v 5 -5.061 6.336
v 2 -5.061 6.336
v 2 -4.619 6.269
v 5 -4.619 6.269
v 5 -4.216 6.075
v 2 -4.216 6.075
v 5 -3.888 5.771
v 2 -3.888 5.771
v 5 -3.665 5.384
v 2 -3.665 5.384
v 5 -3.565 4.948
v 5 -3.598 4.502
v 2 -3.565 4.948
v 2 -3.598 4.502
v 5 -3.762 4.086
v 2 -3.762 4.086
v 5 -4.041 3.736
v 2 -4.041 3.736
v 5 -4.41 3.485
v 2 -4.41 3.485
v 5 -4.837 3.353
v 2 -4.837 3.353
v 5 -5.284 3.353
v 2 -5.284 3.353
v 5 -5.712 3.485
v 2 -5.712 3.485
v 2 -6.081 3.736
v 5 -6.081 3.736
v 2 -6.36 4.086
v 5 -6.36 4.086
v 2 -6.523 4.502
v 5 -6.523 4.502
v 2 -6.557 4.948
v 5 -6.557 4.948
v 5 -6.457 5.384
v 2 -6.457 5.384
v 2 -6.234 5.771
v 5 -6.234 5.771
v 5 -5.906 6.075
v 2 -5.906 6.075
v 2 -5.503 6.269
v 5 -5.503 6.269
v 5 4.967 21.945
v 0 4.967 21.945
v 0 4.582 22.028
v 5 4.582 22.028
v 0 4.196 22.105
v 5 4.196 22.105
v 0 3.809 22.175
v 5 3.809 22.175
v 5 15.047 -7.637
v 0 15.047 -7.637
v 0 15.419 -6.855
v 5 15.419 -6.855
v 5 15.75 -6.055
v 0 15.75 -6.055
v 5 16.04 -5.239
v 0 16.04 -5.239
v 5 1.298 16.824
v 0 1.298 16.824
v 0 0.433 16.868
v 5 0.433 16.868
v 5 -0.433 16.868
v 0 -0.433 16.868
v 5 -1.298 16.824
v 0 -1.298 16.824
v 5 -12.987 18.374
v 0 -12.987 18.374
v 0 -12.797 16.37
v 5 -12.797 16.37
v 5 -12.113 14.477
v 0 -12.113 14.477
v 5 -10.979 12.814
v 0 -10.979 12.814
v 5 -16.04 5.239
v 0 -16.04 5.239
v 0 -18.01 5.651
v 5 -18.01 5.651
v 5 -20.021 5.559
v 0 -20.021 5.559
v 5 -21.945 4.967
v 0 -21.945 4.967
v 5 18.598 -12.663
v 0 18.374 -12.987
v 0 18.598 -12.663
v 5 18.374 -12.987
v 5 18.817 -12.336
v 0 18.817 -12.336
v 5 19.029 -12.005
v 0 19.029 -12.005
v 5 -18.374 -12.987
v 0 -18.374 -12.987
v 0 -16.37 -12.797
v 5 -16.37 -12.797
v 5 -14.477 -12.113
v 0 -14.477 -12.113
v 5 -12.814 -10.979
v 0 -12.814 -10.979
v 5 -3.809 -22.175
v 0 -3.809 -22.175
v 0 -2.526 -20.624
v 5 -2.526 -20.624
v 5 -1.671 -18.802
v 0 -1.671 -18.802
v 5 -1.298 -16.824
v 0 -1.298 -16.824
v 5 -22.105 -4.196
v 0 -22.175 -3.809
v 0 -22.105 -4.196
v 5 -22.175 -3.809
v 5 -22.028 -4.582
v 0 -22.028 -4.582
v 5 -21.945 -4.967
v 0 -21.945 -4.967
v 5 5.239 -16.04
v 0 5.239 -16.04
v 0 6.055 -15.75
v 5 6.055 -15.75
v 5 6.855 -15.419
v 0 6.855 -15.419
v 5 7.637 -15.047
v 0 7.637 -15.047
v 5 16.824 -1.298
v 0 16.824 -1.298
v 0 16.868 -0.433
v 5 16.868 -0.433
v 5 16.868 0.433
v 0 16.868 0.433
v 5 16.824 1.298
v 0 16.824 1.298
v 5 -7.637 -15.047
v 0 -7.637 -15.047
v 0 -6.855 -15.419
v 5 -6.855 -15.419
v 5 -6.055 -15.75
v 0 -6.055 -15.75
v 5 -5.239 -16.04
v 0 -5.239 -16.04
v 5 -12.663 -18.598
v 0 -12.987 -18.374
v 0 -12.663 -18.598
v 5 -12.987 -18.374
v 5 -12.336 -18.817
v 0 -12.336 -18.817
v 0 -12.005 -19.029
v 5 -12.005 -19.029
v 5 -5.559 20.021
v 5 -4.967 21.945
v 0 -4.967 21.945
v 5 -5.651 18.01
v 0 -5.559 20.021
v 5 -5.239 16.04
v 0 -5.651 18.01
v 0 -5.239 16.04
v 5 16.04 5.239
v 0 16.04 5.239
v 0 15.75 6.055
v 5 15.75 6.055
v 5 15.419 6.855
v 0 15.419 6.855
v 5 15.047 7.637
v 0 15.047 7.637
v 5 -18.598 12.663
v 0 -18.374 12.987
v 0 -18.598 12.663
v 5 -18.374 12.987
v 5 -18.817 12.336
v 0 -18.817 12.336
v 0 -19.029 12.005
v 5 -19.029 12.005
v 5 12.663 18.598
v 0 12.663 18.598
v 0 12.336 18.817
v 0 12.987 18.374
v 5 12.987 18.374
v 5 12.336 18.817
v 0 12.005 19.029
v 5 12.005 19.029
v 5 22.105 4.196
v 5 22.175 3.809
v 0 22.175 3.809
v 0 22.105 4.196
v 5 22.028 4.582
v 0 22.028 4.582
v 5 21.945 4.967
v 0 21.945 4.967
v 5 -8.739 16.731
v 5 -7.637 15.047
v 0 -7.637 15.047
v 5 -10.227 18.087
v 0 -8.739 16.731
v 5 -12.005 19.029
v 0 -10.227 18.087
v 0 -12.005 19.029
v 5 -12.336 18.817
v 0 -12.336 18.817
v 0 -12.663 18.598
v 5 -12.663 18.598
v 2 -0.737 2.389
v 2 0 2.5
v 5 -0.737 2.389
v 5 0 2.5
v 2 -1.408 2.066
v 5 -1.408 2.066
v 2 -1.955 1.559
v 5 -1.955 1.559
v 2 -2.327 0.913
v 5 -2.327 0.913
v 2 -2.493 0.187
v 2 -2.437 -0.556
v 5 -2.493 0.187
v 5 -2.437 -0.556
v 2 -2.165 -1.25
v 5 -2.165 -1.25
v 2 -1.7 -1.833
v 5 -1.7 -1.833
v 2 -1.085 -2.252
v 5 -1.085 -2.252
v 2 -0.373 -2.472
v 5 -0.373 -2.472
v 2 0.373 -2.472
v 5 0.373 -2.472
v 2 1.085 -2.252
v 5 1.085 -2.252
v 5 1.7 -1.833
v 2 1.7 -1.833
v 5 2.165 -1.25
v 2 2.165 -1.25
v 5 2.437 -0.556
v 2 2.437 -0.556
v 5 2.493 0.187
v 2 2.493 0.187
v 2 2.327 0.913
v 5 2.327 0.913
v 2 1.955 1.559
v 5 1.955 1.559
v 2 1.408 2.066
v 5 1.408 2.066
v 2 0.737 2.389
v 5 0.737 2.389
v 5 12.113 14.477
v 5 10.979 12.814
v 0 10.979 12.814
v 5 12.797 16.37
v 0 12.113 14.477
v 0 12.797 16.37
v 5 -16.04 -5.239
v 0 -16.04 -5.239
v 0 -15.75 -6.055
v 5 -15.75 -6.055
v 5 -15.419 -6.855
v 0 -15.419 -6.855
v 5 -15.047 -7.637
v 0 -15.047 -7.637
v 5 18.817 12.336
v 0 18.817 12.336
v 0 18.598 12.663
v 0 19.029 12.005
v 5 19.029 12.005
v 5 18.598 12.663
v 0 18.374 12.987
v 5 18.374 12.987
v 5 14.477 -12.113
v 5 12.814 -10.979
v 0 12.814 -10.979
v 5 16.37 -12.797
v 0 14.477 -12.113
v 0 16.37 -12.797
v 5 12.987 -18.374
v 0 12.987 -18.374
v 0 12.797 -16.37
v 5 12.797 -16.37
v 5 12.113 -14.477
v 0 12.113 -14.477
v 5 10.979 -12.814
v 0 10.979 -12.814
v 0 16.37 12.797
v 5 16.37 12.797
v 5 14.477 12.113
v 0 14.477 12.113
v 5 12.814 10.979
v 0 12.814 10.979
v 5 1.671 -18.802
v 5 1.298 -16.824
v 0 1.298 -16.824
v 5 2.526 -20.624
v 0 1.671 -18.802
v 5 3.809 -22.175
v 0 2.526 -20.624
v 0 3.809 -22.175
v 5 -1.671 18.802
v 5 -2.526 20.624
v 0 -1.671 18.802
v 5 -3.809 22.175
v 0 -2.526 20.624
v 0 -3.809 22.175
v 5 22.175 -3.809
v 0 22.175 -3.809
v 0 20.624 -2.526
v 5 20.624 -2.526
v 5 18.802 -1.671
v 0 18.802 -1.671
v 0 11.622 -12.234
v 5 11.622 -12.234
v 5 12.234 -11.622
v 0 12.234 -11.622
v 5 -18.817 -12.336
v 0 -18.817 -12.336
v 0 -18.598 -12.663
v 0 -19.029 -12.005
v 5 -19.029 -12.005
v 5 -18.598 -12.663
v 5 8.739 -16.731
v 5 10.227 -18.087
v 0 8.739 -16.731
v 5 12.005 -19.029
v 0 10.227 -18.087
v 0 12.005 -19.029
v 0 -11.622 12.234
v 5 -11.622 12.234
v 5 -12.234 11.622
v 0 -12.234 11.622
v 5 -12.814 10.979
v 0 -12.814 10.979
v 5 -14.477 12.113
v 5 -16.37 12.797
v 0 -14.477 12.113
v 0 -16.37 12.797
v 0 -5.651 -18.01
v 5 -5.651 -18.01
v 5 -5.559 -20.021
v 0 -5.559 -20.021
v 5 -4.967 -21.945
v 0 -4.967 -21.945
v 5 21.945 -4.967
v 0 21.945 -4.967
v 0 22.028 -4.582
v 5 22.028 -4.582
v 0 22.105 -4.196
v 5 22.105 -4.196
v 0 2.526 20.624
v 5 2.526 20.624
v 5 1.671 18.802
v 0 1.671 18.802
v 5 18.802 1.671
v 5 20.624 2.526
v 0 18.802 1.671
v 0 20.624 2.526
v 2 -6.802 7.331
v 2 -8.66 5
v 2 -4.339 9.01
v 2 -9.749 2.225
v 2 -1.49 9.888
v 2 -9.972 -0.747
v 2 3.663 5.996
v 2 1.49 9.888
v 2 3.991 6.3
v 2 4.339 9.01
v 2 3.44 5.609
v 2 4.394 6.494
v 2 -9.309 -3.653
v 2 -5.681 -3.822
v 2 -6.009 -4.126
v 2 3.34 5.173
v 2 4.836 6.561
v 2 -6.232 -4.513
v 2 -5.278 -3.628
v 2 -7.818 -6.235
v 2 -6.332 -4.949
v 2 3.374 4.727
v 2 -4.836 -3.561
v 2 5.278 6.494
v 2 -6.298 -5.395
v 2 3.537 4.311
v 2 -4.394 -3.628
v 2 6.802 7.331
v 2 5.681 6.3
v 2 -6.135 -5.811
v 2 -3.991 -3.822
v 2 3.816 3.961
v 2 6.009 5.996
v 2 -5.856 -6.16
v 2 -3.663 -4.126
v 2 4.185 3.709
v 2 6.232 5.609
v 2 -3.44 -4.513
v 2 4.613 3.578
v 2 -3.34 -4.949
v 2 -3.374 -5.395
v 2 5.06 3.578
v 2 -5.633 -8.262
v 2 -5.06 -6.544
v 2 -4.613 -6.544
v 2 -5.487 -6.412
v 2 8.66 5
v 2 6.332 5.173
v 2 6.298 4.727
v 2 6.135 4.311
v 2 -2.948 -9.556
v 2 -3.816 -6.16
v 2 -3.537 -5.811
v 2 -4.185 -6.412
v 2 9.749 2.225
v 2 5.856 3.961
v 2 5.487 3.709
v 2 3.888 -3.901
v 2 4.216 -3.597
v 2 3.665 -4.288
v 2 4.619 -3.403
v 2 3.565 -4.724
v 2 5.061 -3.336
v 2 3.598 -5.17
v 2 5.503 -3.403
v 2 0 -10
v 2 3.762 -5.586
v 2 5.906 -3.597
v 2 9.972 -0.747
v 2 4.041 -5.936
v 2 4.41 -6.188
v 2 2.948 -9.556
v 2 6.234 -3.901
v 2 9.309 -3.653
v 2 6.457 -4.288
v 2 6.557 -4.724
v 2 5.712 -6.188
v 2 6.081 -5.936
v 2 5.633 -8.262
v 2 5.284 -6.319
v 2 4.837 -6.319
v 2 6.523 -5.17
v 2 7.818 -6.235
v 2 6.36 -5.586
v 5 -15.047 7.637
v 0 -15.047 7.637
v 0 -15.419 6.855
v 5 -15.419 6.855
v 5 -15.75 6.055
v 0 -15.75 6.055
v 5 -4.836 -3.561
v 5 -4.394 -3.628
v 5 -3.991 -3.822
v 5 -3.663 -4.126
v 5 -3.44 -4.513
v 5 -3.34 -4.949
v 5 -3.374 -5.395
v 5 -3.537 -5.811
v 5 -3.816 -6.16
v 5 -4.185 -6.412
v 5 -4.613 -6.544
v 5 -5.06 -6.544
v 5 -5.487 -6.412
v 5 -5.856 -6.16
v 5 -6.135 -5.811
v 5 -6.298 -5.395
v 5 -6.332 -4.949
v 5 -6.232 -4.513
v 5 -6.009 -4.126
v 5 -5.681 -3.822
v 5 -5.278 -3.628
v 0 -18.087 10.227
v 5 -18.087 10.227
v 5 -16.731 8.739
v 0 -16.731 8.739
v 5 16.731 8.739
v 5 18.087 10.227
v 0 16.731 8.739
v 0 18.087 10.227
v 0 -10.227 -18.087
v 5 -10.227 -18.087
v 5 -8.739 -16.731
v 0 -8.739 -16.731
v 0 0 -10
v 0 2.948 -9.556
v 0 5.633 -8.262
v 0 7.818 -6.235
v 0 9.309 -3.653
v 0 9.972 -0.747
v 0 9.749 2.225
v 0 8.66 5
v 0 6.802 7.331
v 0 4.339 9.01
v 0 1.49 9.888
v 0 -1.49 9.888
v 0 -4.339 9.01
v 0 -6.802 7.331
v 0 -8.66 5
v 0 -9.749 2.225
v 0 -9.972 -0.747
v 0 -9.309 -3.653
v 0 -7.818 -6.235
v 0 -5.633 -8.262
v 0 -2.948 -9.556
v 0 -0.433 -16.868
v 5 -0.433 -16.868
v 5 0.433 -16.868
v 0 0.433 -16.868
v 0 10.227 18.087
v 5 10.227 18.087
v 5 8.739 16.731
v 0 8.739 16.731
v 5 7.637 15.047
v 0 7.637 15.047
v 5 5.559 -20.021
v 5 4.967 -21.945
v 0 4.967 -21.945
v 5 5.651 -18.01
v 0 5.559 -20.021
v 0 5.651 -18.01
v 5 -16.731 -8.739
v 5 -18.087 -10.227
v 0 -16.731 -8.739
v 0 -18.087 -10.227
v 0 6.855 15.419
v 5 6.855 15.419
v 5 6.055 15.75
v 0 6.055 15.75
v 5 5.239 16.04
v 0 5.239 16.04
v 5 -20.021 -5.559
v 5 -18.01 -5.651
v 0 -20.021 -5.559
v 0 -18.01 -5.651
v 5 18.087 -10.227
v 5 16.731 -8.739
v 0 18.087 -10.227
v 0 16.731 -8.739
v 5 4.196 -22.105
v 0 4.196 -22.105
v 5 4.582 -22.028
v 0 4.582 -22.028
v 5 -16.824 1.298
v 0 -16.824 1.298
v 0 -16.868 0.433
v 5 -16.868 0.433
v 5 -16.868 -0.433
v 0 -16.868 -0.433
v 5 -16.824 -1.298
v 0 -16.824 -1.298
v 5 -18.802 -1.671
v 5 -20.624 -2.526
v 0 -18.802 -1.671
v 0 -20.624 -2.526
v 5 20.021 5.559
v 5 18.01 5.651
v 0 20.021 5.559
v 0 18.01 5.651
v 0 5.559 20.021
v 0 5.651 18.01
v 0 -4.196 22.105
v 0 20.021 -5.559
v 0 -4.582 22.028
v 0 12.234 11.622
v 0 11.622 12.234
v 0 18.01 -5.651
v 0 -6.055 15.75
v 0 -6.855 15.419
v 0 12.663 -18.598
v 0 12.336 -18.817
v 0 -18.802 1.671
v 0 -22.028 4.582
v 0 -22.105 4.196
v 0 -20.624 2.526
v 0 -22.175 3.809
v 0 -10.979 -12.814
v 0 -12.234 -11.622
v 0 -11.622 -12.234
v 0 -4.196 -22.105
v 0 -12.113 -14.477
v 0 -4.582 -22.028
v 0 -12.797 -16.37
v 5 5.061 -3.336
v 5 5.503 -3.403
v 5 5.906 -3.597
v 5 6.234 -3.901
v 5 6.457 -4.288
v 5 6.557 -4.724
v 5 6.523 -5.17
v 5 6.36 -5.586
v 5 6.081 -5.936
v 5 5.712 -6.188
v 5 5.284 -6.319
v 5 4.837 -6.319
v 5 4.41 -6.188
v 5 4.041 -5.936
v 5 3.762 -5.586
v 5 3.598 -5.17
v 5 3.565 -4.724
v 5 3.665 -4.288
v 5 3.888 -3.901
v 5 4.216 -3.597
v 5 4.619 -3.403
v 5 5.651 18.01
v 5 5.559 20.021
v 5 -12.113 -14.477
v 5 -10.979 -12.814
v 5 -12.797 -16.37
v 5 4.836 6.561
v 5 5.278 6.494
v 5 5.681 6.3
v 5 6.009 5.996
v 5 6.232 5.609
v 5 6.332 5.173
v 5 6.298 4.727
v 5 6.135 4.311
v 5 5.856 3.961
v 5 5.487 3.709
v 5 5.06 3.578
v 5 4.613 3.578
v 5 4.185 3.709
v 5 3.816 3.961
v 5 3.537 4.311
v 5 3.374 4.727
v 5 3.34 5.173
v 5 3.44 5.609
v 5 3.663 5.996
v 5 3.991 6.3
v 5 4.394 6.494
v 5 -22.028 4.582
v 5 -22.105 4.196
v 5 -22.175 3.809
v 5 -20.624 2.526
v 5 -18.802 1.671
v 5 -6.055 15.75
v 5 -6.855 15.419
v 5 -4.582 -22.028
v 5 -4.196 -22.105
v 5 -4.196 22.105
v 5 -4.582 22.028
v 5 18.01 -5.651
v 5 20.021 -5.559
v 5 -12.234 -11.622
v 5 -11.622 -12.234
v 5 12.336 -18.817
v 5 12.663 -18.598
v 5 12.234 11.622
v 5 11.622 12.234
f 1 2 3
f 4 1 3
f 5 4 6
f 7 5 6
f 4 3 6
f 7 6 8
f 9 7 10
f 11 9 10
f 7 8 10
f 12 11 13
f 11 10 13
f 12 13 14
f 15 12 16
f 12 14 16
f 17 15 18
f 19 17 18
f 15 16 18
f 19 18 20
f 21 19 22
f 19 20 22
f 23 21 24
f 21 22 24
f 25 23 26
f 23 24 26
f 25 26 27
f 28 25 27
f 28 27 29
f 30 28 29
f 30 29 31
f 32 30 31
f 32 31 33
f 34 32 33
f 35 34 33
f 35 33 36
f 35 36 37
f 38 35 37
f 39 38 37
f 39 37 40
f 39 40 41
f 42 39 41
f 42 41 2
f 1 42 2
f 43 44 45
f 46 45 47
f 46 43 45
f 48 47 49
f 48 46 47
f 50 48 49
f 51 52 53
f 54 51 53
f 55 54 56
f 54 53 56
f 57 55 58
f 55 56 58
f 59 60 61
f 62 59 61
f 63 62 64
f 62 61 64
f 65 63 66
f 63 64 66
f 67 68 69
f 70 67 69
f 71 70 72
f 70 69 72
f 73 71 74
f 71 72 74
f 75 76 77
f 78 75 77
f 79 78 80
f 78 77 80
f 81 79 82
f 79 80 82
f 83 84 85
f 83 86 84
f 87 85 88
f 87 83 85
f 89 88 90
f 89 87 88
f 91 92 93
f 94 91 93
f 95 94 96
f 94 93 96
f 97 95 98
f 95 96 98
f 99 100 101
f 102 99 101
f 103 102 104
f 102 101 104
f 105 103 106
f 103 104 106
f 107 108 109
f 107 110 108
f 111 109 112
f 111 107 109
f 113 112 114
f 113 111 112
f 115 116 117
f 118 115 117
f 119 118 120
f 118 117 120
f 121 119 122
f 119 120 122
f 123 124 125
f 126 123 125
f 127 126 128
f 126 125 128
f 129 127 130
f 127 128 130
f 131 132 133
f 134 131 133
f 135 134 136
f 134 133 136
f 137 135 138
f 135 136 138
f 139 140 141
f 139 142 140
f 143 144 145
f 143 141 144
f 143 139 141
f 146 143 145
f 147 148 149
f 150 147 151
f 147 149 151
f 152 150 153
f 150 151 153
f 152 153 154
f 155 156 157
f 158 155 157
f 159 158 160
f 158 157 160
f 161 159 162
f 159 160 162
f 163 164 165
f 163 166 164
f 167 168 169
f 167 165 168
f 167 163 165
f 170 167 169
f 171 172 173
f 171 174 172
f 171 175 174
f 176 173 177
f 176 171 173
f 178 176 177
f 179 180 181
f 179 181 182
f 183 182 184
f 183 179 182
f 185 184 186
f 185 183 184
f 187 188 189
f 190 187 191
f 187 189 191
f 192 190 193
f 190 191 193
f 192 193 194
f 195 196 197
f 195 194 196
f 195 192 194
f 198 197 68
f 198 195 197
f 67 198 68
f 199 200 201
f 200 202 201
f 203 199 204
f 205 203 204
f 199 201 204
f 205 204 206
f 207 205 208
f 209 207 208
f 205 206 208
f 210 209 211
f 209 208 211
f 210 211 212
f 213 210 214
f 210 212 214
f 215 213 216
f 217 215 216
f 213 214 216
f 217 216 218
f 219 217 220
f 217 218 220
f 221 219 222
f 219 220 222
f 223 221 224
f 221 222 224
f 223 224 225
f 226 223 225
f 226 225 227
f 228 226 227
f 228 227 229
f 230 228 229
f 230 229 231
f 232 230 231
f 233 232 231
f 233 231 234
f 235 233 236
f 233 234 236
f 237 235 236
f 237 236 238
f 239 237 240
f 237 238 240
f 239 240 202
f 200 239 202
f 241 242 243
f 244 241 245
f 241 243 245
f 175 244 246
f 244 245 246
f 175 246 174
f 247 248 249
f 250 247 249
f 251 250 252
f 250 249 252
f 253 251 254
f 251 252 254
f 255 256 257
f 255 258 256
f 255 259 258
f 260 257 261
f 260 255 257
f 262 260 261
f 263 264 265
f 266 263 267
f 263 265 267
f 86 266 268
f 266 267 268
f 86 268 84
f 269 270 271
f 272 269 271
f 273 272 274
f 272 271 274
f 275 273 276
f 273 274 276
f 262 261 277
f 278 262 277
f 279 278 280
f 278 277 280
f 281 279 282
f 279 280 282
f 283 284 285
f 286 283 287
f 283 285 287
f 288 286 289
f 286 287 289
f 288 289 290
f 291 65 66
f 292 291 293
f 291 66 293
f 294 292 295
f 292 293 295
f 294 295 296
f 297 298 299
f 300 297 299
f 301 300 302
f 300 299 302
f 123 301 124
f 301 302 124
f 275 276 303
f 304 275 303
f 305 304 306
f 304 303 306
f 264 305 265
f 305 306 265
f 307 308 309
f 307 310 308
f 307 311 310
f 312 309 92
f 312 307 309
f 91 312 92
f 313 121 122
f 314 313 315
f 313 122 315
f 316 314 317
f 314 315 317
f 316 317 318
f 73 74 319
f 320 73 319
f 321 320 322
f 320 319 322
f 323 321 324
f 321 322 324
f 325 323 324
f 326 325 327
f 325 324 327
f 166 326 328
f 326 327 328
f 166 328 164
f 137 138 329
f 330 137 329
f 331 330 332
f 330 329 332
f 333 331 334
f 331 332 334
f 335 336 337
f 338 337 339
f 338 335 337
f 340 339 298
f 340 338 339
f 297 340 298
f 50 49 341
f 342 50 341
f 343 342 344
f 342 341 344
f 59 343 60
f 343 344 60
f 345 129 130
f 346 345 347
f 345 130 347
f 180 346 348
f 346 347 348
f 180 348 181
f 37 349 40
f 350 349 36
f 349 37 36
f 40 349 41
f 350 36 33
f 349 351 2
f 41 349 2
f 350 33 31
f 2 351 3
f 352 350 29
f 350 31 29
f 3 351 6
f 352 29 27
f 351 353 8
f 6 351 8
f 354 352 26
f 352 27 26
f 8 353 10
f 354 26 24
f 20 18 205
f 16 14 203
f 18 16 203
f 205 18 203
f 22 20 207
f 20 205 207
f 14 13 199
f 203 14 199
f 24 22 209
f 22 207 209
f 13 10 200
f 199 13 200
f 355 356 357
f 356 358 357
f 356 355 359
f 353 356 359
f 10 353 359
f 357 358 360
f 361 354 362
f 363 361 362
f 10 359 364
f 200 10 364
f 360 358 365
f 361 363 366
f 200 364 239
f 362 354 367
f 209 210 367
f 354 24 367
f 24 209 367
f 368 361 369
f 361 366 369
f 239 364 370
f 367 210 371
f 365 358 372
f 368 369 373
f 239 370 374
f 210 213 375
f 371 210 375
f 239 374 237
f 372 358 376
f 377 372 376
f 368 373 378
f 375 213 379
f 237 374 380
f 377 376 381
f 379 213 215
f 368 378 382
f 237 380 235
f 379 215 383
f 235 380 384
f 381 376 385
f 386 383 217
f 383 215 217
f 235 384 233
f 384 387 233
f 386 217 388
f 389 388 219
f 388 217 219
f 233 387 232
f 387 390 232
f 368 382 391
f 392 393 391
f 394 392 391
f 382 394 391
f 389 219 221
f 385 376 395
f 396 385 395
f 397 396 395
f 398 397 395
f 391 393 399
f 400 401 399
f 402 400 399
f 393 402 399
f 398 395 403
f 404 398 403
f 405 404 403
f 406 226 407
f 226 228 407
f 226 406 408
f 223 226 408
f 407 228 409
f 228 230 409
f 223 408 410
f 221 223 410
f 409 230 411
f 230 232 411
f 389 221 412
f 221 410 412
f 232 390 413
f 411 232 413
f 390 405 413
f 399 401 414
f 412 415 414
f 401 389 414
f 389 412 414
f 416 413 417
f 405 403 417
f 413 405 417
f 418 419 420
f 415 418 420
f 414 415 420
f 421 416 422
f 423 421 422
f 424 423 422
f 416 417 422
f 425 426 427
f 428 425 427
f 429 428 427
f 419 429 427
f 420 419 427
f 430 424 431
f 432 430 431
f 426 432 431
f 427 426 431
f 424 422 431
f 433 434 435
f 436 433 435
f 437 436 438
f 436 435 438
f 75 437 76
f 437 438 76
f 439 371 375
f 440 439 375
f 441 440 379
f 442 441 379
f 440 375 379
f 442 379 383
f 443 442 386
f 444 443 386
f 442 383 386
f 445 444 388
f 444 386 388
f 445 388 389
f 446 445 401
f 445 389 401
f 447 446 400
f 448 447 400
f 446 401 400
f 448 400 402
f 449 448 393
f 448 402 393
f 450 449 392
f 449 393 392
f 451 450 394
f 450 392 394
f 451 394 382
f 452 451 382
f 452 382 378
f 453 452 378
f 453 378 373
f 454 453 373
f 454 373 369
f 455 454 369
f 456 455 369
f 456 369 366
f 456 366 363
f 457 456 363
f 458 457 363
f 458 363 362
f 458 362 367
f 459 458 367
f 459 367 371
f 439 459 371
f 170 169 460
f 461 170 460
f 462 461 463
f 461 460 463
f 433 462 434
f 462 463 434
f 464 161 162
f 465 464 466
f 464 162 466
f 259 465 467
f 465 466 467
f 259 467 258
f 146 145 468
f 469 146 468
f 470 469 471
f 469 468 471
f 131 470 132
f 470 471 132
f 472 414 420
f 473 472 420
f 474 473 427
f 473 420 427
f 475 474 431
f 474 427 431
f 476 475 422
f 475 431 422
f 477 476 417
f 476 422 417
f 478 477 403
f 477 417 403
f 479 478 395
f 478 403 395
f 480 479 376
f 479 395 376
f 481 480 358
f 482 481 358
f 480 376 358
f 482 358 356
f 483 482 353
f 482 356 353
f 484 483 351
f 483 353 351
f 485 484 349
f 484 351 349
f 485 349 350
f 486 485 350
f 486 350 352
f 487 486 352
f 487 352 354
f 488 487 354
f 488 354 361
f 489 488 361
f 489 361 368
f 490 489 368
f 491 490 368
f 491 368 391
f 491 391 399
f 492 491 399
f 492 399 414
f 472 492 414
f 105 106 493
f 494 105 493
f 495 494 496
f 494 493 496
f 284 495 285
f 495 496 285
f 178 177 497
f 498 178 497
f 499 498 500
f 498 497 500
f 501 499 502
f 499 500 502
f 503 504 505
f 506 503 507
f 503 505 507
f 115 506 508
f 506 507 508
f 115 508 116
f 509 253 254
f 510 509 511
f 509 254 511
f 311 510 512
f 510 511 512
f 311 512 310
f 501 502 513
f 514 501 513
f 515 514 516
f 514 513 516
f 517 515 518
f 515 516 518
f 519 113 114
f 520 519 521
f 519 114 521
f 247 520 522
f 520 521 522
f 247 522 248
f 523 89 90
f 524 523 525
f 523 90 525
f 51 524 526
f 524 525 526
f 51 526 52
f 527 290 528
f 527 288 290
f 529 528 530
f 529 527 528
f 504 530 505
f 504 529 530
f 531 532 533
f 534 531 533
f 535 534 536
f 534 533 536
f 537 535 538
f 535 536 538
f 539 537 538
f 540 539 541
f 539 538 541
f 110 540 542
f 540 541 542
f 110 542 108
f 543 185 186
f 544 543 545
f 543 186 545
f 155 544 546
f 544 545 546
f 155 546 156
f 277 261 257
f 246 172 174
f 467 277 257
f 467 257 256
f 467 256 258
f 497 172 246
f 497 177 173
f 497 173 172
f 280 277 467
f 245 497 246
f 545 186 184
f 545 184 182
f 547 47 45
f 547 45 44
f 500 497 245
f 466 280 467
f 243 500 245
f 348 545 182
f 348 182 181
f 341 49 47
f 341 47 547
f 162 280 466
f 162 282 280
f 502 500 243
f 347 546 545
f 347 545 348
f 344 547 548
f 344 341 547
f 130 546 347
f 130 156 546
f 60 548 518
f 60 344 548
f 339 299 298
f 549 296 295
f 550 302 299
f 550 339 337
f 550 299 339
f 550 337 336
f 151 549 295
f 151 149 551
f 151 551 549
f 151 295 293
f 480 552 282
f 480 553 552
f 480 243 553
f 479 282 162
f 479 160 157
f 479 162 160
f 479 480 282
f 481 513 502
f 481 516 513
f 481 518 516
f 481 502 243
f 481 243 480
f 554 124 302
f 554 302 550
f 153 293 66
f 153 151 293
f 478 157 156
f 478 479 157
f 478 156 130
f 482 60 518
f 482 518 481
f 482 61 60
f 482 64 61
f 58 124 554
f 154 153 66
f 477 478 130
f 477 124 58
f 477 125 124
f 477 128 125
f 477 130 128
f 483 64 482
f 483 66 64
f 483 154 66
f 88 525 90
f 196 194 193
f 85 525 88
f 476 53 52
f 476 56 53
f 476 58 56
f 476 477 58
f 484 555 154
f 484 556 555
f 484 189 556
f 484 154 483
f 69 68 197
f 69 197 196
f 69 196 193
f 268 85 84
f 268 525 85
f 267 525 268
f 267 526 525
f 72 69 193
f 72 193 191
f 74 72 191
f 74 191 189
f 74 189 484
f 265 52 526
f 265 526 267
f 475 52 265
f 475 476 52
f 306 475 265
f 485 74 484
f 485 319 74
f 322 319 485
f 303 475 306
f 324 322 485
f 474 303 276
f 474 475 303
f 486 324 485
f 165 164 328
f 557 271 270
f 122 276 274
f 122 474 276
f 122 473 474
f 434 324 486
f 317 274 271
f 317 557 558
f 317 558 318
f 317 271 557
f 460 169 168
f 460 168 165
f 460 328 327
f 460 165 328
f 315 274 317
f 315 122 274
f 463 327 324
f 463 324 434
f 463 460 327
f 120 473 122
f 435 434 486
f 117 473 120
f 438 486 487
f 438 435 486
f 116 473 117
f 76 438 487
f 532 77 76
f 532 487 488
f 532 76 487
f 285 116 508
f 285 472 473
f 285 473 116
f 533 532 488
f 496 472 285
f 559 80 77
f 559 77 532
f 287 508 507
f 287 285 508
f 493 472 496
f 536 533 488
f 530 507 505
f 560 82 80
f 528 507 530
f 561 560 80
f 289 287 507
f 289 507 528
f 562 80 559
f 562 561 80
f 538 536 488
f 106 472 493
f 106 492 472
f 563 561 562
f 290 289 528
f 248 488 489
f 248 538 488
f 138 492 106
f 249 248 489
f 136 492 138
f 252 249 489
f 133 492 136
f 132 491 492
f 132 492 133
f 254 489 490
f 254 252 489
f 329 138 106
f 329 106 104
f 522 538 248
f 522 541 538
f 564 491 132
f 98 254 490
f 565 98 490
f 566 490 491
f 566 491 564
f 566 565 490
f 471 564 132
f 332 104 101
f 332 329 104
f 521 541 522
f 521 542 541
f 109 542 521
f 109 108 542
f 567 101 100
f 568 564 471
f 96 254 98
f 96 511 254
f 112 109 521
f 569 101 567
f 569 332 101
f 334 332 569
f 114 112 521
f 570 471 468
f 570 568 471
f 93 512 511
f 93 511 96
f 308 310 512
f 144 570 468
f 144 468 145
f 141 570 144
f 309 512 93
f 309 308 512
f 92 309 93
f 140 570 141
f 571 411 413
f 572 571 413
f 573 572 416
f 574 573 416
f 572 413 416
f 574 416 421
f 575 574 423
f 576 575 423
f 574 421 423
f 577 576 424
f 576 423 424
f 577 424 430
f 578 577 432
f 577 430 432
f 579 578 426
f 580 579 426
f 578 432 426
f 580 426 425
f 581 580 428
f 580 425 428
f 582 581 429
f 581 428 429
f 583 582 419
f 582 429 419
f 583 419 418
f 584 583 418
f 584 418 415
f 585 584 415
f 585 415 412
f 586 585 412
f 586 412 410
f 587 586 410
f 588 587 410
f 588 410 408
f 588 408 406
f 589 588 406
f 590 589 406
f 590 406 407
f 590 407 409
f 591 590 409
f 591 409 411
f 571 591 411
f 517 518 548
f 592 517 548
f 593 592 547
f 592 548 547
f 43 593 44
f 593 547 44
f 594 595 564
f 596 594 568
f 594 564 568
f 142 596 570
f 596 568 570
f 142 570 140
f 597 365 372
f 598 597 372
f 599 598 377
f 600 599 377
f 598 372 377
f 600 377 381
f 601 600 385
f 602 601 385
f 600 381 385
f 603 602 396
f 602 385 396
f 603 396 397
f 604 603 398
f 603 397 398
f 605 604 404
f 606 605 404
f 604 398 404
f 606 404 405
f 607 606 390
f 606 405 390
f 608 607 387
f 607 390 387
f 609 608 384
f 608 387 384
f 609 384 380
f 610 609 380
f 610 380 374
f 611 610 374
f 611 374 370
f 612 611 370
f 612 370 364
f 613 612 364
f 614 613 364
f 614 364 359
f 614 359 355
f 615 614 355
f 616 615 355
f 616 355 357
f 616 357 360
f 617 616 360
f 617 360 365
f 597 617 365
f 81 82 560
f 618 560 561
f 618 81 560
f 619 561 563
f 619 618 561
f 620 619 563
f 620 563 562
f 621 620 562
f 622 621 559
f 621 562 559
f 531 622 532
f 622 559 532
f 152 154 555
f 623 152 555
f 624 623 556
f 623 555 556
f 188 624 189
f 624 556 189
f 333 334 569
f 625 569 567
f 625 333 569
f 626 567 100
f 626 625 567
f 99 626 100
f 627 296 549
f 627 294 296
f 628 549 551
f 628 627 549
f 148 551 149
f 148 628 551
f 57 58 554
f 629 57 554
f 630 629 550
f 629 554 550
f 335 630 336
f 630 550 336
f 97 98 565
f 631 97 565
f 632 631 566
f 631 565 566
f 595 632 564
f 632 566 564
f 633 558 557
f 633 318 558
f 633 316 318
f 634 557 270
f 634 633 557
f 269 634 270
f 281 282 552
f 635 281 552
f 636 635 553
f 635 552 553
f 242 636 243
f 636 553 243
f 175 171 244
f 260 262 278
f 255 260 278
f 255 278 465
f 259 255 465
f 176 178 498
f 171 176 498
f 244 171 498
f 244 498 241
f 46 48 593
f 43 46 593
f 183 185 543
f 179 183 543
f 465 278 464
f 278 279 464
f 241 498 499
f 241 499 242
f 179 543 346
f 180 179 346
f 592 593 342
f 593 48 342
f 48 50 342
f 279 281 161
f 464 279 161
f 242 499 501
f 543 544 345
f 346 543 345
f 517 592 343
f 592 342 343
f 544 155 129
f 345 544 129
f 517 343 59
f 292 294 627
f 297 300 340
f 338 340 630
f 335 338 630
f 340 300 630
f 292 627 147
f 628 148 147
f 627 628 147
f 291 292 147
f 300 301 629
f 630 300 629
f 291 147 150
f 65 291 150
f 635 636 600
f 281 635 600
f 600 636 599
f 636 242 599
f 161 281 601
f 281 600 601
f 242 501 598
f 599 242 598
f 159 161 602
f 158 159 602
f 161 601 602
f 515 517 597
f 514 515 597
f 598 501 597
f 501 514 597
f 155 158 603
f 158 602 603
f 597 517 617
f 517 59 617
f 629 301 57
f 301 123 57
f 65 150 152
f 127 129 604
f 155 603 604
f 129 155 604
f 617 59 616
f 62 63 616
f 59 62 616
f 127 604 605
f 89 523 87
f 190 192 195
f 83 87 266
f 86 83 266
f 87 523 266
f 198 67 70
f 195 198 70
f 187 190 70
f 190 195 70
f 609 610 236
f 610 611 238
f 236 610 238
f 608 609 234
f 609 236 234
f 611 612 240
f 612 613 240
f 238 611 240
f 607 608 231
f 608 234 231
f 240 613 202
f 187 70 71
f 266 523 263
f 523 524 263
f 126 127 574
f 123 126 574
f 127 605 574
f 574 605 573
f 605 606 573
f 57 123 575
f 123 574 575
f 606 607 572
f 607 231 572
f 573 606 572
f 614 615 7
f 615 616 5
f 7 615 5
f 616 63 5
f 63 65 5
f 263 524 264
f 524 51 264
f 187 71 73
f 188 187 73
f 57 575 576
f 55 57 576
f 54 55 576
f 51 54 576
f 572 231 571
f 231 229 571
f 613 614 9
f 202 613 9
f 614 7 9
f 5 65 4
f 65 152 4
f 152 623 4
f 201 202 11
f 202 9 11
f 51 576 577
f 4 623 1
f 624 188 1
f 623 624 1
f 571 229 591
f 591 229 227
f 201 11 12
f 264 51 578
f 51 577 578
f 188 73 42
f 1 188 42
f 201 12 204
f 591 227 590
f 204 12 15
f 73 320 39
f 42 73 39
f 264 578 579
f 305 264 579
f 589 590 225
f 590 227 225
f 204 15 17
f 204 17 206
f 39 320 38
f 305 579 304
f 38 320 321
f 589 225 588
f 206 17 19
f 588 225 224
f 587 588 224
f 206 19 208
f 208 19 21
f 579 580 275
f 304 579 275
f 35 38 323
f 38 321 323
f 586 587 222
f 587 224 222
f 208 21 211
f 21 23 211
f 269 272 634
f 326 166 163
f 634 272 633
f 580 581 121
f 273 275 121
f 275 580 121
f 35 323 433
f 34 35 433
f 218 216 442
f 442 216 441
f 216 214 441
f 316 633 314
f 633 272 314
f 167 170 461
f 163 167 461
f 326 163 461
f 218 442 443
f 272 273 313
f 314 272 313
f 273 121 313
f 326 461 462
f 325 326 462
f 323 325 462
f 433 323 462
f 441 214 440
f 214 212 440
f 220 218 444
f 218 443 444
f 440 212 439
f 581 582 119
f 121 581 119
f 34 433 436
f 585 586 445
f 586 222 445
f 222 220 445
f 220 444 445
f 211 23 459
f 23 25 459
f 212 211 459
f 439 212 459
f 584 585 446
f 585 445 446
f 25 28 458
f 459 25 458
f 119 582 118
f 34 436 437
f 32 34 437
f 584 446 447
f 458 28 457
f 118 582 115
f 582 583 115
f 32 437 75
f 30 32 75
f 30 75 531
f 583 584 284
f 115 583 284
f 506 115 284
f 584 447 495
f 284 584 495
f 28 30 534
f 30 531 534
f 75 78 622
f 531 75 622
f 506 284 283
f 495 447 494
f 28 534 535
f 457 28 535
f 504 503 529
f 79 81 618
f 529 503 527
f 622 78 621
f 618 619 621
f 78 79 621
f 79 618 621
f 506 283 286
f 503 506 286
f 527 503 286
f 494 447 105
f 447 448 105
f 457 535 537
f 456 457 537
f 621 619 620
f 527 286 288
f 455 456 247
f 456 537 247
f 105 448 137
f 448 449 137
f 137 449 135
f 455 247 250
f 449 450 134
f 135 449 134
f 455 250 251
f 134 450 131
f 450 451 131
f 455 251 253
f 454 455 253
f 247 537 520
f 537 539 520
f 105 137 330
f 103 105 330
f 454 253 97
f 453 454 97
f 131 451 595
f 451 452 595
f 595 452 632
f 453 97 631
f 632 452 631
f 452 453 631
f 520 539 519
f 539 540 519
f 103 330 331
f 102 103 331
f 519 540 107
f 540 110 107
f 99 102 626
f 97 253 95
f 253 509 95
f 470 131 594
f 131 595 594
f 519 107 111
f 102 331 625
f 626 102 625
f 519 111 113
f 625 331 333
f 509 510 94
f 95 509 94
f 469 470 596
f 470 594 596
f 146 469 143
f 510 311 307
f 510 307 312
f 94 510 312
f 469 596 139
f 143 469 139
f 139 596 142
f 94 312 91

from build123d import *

# Parameters (mm, degrees)
BASPROSKE_W             = 5
BASPROSKE_H             = 22.5
TOOTHCUT_DEPTH          = 33.210246817
TEETHCUTS_COUNT         = 16
TEETHCUTS_ANGLE         = 337.5
BORSKE_R                = 2.5
BORE_DEPTH              = 50.0000508
ENL_V_START             = -3
ESQUISSE3_R             = 10
ENL_V_MAT_EXTRU_3_DEPTH = 29.756555396
ESQUISSE8_R             = 1.5
ENL_V_MAT_EXTRU_4_DEPTH = 32.756555396


with BuildPart() as part:
    # BasProSke → Base-Revolve (revolve)
    with BuildSketch(Plane(origin=(0, 0, 0), x_dir=(1, 0, 0), z_dir=(0, 1, 0)), mode=Mode.PRIVATE) as base_revolve_sk:
        with Locations((2.5, 11.25)):
            Rectangle(BASPROSKE_W, BASPROSKE_H)
    revolve(base_revolve_sk.sketch.rotate(Axis((-10, 0, 0), (1, 0, 0)), 180), axis=Axis((-10, 0, 0), (1, 0, 0)))

    # TooCutSke → ToothCut (cut, through all)
    with BuildSketch(Plane(origin=(0, 0, 0), x_dir=(0, 0, -1), z_dir=(1, 0, 0))):
        with BuildLine():
            ThreePointArc((1.297749273, 16.824022195), (0, 16.874), (-1.297749273, 16.824022195))
            ThreePointArc((-1.297749273, 16.824022195), (-2.047921493, 19.754510488), (-3.832565589, 22.196961192))
            ThreePointArc((-3.832565589, 22.196961192), (0, 22.5254), (3.832565589, 22.196961192))
            ThreePointArc((3.832565589, 22.196961192), (2.047921493, 19.754510488), (1.297749273, 16.824022195))
        make_face()
    toothcut = extrude(amount=TOOTHCUT_DEPTH, mode=Mode.SUBTRACT)

    # TeethCuts: ToothCut ×16 about axis
    teethcuts_axis = Axis((-10, 0, 0), (1, 0, 0))
    for i in range(1, TEETHCUTS_COUNT):
        add(toothcut.rotate(teethcuts_axis, i * TEETHCUTS_ANGLE / (TEETHCUTS_COUNT - 1)), mode=Mode.SUBTRACT)

    # BorSke → Bore (cut, symmetric)
    with BuildSketch(Plane(origin=(0, 0, 0), x_dir=(0, 0, -1), z_dir=(1, 0, 0))):
        with Locations(Location((0, 0, 0), (0, 0, 180))):
            Circle(BORSKE_R)
    extrude(amount=BORE_DEPTH, both=True, mode=Mode.SUBTRACT)

    # Esquisse3 → Enlèv. mat.-Extru.3 (cut, through all)
    with BuildSketch(Plane(origin=(5, 0, 0), x_dir=(0, 0, -1), z_dir=(1, 0, 0)).offset(ENL_V_START)):
        Circle(ESQUISSE3_R)
    extrude(amount=-ENL_V_MAT_EXTRU_3_DEPTH, mode=Mode.SUBTRACT)

    # Esquisse8 → Enlèv. mat.-Extru.4 (cut, through all)
    with BuildSketch(Plane.ZY):
        with Locations((5.060877471, 4.836064435)):
            Circle(ESQUISSE8_R)
        with Locations((-4.836064435, 5.060877471)):
            Circle(ESQUISSE8_R)
        with Locations((4.836064435, -5.060877471)):
            Circle(ESQUISSE8_R)
        with Locations((-5.060877471, -4.836064435)):
            Circle(ESQUISSE8_R)
    extrude(amount=-ENL_V_MAT_EXTRU_4_DEPTH, mode=Mode.SUBTRACT)


solid = part.part
